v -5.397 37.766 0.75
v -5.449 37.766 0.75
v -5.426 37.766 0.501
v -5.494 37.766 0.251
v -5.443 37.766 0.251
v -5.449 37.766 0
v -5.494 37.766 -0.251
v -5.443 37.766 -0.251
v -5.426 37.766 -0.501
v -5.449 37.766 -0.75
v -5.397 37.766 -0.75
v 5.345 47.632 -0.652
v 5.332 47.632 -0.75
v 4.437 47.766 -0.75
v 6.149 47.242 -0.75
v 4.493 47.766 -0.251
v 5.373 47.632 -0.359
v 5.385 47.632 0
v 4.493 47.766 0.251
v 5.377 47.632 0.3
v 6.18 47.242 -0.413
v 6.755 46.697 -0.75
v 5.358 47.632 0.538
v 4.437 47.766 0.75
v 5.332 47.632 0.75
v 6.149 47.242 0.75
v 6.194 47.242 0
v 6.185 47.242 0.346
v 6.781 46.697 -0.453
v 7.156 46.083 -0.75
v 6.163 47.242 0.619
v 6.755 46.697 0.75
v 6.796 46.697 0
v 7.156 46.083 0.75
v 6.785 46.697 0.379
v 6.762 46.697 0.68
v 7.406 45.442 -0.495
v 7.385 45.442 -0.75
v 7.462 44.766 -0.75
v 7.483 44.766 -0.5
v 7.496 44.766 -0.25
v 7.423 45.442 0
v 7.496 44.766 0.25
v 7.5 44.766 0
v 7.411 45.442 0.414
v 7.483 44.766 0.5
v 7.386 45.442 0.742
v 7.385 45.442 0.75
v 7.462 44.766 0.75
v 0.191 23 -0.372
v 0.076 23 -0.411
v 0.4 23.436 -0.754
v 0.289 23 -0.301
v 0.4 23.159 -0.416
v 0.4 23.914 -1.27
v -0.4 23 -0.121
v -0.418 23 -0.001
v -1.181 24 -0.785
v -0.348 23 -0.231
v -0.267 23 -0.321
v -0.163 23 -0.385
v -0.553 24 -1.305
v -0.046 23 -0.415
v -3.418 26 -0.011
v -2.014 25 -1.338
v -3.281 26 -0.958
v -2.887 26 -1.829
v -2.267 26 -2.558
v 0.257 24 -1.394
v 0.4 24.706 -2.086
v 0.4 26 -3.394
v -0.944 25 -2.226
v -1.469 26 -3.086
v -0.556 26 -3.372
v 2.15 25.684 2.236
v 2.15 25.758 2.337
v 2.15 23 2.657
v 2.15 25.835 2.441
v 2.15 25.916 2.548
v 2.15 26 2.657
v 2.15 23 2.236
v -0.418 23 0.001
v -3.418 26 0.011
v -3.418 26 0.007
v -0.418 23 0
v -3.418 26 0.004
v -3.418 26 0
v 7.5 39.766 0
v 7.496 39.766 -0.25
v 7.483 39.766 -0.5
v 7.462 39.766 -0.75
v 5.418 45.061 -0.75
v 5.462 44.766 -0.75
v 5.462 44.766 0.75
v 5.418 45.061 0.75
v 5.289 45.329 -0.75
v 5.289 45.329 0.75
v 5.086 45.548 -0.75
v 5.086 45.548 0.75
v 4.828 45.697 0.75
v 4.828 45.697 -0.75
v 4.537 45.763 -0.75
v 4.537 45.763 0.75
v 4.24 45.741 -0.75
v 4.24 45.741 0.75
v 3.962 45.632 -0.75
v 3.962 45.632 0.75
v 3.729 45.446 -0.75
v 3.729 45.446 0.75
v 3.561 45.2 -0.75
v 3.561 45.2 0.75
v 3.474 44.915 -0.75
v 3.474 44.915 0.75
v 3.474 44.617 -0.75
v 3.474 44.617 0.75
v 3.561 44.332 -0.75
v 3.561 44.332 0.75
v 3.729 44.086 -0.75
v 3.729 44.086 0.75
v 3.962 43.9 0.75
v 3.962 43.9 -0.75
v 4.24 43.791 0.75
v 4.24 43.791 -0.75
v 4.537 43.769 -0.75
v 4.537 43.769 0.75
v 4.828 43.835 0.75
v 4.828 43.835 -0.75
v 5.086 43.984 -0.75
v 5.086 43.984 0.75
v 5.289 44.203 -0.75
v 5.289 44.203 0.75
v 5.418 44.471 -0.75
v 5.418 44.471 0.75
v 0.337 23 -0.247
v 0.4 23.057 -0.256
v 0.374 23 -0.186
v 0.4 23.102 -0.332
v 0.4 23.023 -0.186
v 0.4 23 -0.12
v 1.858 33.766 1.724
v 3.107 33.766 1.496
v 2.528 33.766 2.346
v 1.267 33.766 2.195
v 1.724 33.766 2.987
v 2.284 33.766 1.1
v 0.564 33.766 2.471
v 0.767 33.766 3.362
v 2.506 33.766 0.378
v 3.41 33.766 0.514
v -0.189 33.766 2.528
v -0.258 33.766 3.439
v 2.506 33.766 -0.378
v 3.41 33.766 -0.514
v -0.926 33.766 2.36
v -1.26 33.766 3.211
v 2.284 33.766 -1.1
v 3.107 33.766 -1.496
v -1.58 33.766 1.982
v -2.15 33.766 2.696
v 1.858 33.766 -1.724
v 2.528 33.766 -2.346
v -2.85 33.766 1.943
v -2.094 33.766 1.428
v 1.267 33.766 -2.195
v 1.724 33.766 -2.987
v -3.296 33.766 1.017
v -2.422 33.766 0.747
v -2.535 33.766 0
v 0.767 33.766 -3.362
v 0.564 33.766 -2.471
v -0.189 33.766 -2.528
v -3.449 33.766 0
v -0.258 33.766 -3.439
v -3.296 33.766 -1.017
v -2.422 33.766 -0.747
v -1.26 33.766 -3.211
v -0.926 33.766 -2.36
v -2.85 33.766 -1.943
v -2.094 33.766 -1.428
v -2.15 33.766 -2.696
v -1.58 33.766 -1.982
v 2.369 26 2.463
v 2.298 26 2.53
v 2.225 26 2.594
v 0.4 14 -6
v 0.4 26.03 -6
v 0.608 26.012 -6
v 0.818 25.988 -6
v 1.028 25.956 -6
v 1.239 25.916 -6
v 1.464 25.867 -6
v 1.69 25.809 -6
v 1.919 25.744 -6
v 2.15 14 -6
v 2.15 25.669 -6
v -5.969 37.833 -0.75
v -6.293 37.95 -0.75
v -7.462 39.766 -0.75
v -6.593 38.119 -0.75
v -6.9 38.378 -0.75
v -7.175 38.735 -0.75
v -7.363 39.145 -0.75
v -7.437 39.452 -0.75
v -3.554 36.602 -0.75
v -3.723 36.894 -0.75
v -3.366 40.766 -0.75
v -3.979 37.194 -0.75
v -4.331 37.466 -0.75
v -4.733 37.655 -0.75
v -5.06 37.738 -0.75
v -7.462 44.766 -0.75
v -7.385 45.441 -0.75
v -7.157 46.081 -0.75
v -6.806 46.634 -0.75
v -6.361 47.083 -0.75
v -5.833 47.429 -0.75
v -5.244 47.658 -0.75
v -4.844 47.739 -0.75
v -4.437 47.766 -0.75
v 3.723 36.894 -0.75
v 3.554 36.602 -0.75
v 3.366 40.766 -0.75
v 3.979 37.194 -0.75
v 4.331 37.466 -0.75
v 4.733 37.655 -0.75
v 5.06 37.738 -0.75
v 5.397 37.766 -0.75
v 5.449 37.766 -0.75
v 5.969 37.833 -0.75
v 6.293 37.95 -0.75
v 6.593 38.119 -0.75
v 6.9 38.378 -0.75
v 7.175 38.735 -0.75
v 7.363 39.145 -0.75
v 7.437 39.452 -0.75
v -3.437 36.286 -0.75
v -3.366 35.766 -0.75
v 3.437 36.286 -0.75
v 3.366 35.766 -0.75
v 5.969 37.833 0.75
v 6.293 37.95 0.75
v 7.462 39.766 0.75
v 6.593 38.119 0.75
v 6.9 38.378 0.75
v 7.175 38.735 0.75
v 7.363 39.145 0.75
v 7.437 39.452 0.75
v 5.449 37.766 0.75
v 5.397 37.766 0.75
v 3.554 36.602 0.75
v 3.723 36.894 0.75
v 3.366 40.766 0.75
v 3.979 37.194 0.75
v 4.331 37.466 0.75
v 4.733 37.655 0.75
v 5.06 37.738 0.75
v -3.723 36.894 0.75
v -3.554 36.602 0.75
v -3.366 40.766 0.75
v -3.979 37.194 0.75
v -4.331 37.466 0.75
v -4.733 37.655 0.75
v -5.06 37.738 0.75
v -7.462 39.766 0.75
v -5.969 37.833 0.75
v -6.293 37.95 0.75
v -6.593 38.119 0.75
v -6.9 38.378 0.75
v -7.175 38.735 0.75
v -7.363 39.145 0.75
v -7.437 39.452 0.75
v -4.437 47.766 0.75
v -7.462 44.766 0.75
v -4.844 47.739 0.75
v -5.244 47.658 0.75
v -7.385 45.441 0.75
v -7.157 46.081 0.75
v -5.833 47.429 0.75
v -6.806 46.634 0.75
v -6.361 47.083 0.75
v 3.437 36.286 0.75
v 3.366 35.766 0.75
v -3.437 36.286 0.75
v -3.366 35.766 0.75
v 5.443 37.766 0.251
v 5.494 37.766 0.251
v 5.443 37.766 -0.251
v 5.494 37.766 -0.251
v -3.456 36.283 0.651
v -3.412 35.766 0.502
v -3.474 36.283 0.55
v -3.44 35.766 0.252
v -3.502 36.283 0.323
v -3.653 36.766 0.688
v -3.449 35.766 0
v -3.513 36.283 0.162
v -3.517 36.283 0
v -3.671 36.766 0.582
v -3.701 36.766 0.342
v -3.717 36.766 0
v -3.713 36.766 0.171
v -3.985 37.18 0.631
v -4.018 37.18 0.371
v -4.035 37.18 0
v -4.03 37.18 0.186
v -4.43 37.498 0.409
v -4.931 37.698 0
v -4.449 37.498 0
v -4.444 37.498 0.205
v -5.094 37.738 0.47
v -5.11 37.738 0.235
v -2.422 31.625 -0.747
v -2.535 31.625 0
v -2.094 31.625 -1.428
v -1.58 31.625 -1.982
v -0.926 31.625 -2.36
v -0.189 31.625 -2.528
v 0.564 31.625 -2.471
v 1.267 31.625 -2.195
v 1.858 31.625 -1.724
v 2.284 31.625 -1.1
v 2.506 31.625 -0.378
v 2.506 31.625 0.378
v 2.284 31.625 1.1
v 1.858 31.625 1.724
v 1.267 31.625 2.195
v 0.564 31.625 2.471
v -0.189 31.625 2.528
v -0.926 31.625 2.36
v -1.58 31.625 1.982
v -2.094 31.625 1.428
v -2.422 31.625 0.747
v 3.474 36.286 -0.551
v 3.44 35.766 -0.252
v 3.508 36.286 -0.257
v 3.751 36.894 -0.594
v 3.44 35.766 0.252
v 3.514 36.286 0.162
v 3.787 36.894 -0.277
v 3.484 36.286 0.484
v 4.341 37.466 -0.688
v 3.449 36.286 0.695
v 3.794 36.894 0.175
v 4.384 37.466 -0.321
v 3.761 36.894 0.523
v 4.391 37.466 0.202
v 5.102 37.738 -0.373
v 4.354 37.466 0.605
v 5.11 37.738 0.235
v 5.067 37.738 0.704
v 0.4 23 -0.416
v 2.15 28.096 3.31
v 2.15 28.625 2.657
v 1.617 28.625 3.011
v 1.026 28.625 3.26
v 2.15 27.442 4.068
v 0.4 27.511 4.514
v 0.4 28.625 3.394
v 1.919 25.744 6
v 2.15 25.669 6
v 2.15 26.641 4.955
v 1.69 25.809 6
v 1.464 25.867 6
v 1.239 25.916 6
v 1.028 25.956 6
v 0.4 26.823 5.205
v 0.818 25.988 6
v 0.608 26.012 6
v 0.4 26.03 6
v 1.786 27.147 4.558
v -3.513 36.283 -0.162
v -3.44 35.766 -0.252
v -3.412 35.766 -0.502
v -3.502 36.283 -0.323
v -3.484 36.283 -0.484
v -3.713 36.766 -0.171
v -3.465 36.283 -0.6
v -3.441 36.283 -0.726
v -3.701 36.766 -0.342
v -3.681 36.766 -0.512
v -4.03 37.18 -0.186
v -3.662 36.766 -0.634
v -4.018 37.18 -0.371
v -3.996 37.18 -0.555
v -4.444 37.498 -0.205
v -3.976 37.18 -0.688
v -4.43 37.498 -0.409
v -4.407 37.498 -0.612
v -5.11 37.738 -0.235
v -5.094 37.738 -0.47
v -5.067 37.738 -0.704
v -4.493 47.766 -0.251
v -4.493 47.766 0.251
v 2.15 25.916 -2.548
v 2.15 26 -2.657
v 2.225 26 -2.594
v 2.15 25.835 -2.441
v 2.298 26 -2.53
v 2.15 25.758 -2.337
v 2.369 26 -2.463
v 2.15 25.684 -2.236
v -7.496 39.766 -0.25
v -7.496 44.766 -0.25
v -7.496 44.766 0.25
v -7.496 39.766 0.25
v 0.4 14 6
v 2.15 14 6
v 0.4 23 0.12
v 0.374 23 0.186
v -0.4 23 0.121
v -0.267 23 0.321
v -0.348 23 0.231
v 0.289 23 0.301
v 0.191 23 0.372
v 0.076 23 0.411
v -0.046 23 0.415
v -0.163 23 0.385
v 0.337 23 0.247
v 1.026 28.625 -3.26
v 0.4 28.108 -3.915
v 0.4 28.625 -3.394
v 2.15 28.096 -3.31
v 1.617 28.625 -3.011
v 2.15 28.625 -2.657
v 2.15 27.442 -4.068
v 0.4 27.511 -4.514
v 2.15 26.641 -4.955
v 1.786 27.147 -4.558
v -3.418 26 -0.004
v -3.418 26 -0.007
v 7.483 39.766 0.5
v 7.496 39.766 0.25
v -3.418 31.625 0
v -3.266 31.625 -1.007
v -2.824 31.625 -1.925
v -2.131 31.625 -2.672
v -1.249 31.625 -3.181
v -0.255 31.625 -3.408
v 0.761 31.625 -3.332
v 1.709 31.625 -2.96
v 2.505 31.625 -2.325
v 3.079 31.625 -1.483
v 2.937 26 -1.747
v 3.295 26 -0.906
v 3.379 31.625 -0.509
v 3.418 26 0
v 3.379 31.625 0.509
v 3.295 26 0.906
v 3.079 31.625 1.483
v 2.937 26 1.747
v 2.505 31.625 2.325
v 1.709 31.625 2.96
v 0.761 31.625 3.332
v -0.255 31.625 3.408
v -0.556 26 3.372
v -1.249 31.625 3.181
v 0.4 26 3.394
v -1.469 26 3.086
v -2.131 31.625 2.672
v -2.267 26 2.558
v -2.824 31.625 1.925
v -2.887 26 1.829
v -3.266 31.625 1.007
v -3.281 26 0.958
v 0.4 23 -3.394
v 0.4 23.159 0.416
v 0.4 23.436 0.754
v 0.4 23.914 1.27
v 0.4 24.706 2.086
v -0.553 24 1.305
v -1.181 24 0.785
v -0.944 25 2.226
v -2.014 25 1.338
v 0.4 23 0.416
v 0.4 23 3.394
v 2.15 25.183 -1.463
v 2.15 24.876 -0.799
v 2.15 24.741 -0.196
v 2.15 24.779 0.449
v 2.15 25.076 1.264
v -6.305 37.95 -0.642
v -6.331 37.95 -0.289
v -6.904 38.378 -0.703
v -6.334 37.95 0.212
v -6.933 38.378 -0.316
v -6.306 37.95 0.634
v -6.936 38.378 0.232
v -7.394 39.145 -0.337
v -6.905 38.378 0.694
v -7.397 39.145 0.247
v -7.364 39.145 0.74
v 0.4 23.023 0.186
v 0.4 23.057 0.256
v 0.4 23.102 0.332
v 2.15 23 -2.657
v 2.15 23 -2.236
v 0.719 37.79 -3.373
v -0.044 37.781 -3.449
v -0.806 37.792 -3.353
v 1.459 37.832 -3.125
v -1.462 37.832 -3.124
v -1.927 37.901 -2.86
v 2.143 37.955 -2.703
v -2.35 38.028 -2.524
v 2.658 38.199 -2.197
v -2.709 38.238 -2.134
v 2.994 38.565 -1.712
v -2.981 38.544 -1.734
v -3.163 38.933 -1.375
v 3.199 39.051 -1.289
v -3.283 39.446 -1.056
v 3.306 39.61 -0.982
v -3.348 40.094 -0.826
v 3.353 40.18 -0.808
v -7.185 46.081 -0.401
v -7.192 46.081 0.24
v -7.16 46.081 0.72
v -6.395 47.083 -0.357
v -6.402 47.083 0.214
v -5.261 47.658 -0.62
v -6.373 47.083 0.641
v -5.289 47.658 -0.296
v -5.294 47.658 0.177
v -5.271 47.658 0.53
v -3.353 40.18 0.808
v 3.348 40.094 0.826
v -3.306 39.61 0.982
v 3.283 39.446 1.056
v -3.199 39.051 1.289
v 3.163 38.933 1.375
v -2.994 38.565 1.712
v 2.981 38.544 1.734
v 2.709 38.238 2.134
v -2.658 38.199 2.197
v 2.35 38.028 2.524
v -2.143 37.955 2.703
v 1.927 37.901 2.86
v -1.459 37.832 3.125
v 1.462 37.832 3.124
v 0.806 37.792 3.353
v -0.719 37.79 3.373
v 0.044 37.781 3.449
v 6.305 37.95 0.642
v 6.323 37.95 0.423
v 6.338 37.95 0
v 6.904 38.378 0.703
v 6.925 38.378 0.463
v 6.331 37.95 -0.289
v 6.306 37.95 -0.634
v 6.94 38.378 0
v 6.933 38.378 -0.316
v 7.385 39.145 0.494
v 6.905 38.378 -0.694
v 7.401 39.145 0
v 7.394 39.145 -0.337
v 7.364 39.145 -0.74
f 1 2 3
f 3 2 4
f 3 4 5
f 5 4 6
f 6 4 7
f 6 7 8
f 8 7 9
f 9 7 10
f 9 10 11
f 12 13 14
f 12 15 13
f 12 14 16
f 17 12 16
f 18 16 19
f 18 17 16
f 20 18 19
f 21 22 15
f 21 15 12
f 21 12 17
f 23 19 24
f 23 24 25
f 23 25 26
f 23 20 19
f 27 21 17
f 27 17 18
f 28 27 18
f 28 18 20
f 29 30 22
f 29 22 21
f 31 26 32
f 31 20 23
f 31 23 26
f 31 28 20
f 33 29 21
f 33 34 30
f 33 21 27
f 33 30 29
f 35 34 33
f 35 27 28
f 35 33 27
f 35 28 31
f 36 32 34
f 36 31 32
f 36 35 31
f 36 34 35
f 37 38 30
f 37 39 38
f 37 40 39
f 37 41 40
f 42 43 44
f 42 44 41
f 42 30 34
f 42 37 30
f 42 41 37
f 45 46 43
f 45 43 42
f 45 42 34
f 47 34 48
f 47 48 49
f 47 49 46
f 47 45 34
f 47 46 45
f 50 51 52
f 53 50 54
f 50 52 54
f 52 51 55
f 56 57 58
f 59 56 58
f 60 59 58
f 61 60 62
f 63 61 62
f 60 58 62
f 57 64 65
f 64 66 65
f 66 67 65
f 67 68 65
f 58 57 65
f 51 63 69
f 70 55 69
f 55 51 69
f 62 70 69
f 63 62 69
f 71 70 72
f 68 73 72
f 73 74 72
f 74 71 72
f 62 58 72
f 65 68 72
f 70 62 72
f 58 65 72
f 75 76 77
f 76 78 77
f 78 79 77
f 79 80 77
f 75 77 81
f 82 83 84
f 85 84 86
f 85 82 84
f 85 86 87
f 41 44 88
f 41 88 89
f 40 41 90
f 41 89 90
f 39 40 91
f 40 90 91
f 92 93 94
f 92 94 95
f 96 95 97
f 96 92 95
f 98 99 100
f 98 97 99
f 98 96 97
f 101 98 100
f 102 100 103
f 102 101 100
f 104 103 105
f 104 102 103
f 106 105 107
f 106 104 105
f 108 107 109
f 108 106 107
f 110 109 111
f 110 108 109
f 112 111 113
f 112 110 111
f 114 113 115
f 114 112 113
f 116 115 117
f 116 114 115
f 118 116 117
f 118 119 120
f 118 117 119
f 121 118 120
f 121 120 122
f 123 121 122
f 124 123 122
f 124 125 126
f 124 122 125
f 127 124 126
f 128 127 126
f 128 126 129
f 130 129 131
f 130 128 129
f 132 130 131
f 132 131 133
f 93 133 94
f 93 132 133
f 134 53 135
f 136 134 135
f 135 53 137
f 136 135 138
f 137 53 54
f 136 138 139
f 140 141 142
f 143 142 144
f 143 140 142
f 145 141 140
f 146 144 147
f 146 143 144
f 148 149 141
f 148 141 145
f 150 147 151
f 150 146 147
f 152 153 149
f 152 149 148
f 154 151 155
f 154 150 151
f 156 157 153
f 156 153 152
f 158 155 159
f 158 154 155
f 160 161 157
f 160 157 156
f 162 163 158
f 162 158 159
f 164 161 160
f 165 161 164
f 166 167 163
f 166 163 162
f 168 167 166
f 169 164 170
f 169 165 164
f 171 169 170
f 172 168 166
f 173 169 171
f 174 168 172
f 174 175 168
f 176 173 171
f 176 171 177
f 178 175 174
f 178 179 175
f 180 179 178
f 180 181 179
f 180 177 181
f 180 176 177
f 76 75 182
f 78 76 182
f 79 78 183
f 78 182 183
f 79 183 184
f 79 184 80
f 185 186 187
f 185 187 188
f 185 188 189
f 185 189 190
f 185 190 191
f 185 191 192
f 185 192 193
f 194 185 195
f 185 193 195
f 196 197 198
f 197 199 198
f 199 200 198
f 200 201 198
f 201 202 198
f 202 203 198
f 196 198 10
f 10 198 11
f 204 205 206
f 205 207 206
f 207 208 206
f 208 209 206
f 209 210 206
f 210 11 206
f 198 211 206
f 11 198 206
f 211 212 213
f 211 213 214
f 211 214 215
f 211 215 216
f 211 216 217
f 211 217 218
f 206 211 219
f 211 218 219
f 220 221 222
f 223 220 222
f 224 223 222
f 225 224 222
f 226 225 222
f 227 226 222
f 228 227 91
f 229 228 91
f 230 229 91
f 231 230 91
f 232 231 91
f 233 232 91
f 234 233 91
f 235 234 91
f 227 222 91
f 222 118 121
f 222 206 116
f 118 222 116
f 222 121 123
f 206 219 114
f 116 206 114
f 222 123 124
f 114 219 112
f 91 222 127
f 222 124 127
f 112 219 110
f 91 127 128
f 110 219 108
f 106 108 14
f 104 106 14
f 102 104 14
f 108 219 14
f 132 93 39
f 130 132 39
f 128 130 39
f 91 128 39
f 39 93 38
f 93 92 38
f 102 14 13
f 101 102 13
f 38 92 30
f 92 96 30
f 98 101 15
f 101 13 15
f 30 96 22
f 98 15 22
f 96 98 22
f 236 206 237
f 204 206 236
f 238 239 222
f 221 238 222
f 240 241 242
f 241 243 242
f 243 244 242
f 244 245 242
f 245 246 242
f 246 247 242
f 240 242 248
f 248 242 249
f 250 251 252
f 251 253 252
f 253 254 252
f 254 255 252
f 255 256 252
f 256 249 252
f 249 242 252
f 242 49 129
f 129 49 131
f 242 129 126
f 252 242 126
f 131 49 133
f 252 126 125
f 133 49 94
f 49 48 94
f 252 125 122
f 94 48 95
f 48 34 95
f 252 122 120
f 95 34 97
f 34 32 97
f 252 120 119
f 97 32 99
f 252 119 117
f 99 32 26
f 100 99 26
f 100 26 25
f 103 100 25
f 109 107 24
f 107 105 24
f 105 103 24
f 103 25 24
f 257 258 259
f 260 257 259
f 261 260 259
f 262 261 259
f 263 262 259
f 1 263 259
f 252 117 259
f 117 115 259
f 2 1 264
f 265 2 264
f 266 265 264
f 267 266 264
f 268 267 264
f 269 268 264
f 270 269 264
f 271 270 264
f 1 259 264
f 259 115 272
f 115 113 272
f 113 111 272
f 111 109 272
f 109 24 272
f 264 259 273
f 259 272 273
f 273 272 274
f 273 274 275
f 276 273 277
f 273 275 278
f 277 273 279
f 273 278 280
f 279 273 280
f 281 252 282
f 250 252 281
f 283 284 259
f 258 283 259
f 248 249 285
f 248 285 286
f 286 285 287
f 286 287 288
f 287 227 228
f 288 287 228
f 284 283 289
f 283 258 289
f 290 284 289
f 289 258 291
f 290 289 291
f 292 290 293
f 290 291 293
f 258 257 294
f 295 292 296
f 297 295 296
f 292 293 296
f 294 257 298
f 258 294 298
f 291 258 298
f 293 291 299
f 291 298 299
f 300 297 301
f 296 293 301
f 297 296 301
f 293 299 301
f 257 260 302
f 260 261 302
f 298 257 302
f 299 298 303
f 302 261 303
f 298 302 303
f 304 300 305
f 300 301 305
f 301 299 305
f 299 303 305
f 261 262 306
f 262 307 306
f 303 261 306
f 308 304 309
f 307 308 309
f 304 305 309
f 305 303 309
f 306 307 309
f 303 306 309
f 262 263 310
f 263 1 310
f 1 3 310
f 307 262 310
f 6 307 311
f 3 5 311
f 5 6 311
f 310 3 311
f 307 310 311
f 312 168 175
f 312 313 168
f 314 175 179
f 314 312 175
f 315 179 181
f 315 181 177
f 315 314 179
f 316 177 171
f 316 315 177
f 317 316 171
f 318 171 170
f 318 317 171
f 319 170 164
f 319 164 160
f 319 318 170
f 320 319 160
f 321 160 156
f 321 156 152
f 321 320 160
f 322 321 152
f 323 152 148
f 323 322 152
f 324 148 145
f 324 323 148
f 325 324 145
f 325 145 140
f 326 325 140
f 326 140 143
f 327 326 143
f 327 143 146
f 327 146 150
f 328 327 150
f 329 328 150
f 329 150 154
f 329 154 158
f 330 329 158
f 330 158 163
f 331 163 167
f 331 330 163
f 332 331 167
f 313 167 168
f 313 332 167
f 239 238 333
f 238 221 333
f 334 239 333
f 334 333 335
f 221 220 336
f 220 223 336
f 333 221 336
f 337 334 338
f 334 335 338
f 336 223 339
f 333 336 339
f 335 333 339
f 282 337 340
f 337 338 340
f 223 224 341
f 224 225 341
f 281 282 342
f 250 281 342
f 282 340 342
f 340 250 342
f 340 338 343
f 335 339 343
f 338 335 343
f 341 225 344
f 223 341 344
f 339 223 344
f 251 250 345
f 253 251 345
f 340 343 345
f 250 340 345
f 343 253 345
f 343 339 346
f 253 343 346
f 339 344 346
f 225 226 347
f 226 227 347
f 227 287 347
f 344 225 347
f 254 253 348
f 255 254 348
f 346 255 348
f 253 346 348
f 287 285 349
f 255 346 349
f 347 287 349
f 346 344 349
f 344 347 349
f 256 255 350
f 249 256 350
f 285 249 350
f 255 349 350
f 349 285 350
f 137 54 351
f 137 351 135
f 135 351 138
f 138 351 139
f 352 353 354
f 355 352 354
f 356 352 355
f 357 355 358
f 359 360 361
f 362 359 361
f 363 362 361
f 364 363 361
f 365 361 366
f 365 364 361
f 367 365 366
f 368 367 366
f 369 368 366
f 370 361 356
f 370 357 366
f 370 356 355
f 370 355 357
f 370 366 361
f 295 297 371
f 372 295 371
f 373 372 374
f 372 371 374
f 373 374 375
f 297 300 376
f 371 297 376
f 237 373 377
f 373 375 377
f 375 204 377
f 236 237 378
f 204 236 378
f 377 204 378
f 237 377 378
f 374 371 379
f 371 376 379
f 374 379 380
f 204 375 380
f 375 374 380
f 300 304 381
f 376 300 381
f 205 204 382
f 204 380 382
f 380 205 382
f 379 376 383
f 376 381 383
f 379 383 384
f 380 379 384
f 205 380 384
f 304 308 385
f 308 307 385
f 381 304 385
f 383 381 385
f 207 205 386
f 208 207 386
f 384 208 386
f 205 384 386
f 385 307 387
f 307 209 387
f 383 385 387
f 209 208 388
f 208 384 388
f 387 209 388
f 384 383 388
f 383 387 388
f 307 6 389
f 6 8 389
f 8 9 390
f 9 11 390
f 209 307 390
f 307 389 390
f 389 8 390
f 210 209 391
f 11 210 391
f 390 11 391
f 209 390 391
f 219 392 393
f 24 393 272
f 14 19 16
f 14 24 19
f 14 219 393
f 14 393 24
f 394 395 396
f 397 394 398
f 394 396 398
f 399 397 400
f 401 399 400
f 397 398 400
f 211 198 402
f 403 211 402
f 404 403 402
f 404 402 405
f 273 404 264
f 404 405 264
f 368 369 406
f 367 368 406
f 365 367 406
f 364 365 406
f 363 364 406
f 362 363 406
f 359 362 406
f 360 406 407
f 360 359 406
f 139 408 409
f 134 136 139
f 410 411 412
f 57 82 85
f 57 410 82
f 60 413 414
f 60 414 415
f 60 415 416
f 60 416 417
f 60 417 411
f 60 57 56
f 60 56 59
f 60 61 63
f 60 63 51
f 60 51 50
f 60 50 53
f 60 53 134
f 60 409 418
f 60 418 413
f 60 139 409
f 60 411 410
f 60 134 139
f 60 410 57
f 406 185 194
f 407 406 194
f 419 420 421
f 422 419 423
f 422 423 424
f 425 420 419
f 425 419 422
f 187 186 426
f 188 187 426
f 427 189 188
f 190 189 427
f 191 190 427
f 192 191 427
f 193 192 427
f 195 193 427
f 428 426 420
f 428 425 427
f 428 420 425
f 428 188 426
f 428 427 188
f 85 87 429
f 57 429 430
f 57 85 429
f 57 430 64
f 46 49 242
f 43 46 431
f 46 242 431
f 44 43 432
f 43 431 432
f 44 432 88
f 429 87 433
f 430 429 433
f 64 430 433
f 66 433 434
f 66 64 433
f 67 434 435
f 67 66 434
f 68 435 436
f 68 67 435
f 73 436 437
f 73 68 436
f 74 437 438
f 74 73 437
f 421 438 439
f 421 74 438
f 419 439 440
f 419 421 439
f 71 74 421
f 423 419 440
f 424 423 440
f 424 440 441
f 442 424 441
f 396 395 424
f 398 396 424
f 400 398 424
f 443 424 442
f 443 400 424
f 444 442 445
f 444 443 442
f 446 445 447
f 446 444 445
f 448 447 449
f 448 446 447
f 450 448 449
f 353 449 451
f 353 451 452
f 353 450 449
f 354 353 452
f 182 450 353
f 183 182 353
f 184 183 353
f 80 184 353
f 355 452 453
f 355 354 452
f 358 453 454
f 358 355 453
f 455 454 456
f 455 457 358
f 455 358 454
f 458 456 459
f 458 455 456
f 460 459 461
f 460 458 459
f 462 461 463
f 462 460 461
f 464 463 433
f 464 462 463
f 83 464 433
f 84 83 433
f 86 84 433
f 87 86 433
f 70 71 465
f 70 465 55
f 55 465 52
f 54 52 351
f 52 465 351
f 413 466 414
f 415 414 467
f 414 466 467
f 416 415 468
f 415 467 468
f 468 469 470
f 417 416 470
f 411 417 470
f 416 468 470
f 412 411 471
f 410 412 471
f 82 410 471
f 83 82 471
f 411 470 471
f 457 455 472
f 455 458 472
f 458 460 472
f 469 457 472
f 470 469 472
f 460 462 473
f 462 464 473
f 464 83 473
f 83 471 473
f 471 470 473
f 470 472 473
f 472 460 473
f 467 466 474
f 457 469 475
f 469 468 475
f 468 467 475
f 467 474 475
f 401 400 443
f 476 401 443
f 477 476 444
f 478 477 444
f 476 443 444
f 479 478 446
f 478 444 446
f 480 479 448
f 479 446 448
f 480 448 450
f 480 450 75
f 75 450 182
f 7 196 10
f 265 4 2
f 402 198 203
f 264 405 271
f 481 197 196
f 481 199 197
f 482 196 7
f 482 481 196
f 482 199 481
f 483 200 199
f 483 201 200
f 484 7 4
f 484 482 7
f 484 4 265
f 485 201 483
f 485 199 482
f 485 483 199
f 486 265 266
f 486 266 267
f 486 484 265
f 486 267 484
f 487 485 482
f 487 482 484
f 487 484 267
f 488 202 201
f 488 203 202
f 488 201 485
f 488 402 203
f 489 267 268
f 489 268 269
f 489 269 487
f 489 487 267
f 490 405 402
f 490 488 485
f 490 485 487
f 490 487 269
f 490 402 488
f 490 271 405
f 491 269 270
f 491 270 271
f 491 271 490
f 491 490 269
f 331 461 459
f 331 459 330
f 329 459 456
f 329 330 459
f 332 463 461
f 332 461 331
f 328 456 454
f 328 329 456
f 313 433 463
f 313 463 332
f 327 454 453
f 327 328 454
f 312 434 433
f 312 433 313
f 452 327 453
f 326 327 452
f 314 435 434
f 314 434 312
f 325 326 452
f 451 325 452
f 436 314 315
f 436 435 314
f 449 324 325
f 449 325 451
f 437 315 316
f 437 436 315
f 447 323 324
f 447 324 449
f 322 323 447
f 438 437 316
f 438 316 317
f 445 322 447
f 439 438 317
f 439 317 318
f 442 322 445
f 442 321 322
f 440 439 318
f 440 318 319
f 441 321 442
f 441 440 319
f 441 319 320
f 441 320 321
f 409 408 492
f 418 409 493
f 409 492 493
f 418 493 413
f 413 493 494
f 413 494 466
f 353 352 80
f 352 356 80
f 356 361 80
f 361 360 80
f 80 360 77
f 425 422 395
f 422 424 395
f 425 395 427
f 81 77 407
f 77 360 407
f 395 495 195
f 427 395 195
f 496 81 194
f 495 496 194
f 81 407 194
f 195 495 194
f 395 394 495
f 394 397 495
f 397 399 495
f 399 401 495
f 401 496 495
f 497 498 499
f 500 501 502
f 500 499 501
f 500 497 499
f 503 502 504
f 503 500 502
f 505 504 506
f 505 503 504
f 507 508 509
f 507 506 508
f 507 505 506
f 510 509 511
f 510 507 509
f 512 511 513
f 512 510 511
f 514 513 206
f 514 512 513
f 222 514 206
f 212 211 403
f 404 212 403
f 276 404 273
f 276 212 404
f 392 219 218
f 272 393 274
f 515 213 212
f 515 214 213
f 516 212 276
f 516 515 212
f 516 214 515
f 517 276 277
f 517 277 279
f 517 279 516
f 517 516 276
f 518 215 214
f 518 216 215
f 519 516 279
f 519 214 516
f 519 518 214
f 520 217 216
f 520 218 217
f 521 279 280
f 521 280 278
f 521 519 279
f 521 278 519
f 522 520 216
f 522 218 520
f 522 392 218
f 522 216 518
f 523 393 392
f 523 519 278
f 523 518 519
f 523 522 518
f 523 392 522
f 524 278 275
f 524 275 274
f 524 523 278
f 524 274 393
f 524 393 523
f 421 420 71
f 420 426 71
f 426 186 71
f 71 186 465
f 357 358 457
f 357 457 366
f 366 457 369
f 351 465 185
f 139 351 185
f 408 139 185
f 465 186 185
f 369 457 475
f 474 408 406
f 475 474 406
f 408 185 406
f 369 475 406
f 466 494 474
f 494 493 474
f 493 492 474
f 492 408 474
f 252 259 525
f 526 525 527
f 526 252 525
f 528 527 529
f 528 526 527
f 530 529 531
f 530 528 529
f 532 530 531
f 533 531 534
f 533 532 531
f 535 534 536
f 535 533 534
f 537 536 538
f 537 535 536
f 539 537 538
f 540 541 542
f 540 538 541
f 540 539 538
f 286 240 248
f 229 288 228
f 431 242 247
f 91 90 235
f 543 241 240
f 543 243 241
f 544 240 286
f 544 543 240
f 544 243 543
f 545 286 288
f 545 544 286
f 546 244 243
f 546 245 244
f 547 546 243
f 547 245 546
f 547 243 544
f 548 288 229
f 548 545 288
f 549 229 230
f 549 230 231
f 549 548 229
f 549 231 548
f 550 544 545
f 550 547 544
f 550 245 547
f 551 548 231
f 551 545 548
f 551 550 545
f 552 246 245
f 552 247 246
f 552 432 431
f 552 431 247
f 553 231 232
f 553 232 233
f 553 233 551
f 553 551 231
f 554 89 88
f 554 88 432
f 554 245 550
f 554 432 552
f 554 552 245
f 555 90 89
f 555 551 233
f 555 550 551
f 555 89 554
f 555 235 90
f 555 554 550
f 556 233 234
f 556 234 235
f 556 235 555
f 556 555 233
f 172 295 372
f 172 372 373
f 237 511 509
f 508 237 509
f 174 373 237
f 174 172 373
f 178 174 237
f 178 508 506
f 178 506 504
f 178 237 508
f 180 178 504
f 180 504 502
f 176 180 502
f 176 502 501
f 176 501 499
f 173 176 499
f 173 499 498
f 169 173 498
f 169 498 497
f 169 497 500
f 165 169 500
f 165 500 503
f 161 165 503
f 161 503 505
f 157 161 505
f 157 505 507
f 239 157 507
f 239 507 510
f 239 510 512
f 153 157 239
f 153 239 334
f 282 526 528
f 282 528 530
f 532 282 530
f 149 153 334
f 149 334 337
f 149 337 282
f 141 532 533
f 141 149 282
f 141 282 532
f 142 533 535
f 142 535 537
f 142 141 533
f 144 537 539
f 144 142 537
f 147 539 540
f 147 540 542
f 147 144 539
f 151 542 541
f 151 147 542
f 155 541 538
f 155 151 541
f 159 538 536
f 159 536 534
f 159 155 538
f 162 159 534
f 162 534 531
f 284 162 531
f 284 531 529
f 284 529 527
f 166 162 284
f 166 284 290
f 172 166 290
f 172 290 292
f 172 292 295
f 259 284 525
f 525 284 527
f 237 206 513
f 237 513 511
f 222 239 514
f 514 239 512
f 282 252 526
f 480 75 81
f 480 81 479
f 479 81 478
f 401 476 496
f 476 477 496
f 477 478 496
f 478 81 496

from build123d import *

# Parameters (mm, degrees)
BOSS_EXTRUDE1_DEPTH      = 10
FILLET2_R                = 2
FILLET3_R                = 3
CUT_EXTRUDE1_DEPTH       = 49.473897211
CUT_EXTRUDE1_DEPTH_BACK  = 49.473897211
SKETCH3_R                = 1
BOSS_EXTRUDE2_DEPTH      = 6
BOSS_EXTRUDE2_DEPTH_BACK = 6
SKETCH4_W                = 1.75
SKETCH4_H                = 11.625349657
CHAMFER1_SIZE            = 3
CHAMFER2_SIZE            = 3


with BuildPart() as part:
    # Sketch1 → Revolve1 (revolve)
    with BuildSketch(Plane.XY):
        Polygon((-3.448914015, 37.765821371), (-3.448914015, 33.765821371), (-2.534753992, 33.765821371), (-2.534753992, 31.624967984), (-3.41766068, 31.624967984), (-3.41766068, 23), (0, 23), (0, 37.765821371), align=None)
    revolve(axis=Axis((0, 37.765821371, 0), (0, -1, 0)))

    # Sketch2 → Boss-Extrude1 (add)
    with BuildSketch(Plane(origin=(0, 37.765821371, 0), x_dir=(1, 0, 0), z_dir=(0, 1, 0))):
        with BuildLine():
            Line((3.366379046, 0.75), (-3.366379046, 0.75))
            ThreePointArc((-3.366379046, 0.75), (-3.448914015, 0), (-3.366379046, -0.75))
            Line((-3.366379046, -0.75), (3.366379046, -0.75))
            ThreePointArc((3.366379046, -0.75), (3.428218178, -0.37726384), (3.448914015, 0))
            ThreePointArc((3.448914015, 0), (3.428218178, 0.37726384), (3.366379046, 0.75))
        make_face()
        with BuildLine():
            Line((-3.366379046, 0.75), (-7.462405778, 0.75))
            ThreePointArc((-7.462405778, 0.75), (-7.5, 0), (-7.462405778, -0.75))
            Line((-7.462405778, -0.75), (-3.366379046, -0.75))
            ThreePointArc((-3.366379046, -0.75), (-3.448914015, 0), (-3.366379046, 0.75))
        make_face()
        with BuildLine():
            ThreePointArc((7.5, 0), (7.490595548, 0.375470813), (7.462405778, 0.75))
            Line((7.462405778, 0.75), (3.366379046, 0.75))
            ThreePointArc((3.366379046, 0.75), (3.428218178, 0.37726384), (3.448914015, 0))
            ThreePointArc((3.448914015, 0), (3.428218178, -0.37726384), (3.366379046, -0.75))
            Line((3.366379046, -0.75), (7.462405778, -0.75))
            ThreePointArc((7.462405778, -0.75), (7.490595548, -0.375470813), (7.5, 0))
        make_face()
    extrude(amount=BOSS_EXTRUDE1_DEPTH)

    # Fillet2
    # the kernel refuses this fillet: 2 mm, written as the material it adds along each edge
    with BuildSketch(Plane(origin=(0, 37.765821371, 0), x_dir=(-0.09803421101524086, 0, -0.9951830452085783), z_dir=(-0.9951830452085783, 0, 0.09803421101524086))) as fillet2_piece_1_section:
        with BuildLine():
            CenterArc((3.448914015 + FILLET2_R, FILLET2_R), FILLET2_R, 180, 90)
            Line((3.448914015 + FILLET2_R, 0), (3.448914015, 0))
            Line((3.448914015, 0), (3.448914015, FILLET2_R))
        make_face()
    fillet2_piece_1 = revolve(axis=Axis((0, 37.765821371, 0), (0, -1, 0)), revolution_arc=191.251965623, mode=Mode.PRIVATE)
    fillet2_piece_1 = split(fillet2_piece_1, bisect_by=Plane(origin=(3.870689991, 37.318827735, -0.75), z_dir=(0, 0, 1)), keep=Keep.TOP, mode=Mode.PRIVATE)
    fillet2_piece_1 = split(fillet2_piece_1, bisect_by=Plane(origin=(3.870689991, 37.318827735, 0.75), z_dir=(0, 0, -1)), keep=Keep.TOP, mode=Mode.PRIVATE)
    add(fillet2_piece_1)
    with BuildSketch(Plane(origin=(0, 37.765821371, 0), x_dir=(0.09800035789508027, 0, 0.9951863794548418), z_dir=(0.9951863794548418, 0, -0.09800035789508027))) as fillet2_piece_2_section:
        with BuildLine():
            CenterArc((3.448914015 + FILLET2_R, FILLET2_R), FILLET2_R, 180, 90)
            Line((3.448914015 + FILLET2_R, 0), (3.448914015, 0))
            Line((3.448914015, 0), (3.448914015, FILLET2_R))
        make_face()
    fillet2_piece_2 = revolve(axis=Axis((0, 37.765821371, 0), (0, -1, 0)), revolution_arc=95.624033786, mode=Mode.PRIVATE)
    fillet2_piece_2 = split(fillet2_piece_2, bisect_by=Plane(origin=(-3.870690025, 37.318827894, 0.75), z_dir=(0, 0, -1)), keep=Keep.TOP, mode=Mode.PRIVATE)
    add(fillet2_piece_2)
    with BuildSketch(Plane(origin=(0, 37.765821371, 0), x_dir=(-1, 0, 0), z_dir=(0, 0, 1))) as fillet2_piece_3_section:
        with BuildLine():
            CenterArc((3.448914015 + FILLET2_R, FILLET2_R), FILLET2_R, 180, 90)
            Line((3.448914015 + FILLET2_R, 0), (3.448914015, 0))
            Line((3.448914015, 0), (3.448914015, FILLET2_R))
        make_face()
    fillet2_piece_3 = revolve(axis=Axis((0, 37.765821371, 0), (0, -1, 0)), revolution_arc=95.624033786, mode=Mode.PRIVATE)
    fillet2_piece_3 = split(fillet2_piece_3, bisect_by=Plane(origin=(-3.870689874, 37.318828004, -0.75), z_dir=(0, 0, 1)), keep=Keep.TOP, mode=Mode.PRIVATE)
    add(fillet2_piece_3)
    # the kernel refuses this fillet: 2 mm, written as the material it takes off along each edge
    with BuildSketch(Plane(origin=(0, 37.765821371, 0), x_dir=(-0.7201079494948177, 0, -0.6938620475817721), z_dir=(0.6938620475817721, 0, -0.7201079494948177))) as fillet2_2_piece_1:
        with BuildLine():
            CenterArc((7.5 - FILLET2_R, FILLET2_R), FILLET2_R, 270, 90)
            Line((7.5, FILLET2_R), (7.5, 0))
            Line((7.5, 0), (7.5 - FILLET2_R, 0))
        make_face()
    revolve(axis=Axis((0, 37.765821371, 0), (0, 1, 0)), revolution_arc=87.873212667, mode=Mode.SUBTRACT)
    with BuildSketch(Plane(origin=(0, 37.765821371, 0), x_dir=(0.7201079494948216, 0, 0.6938620475817678), z_dir=(-0.6938620475817678, 0, 0.7201079494948216))) as fillet2_2_piece_2:
        with BuildLine():
            CenterArc((7.5 - FILLET2_R, FILLET2_R), FILLET2_R, 270, 90)
            Line((7.5 - FILLET2_R, 0), (7.5, 0))
            Line((7.5, 0), (7.5, FILLET2_R))
        make_face()
    revolve(axis=Axis((0, 37.765821371, 0), (0, 1, 0)), revolution_arc=87.873212667, mode=Mode.SUBTRACT)

    # Fillet3
    # the kernel refuses this fillet: 3 mm, written as the material it adds along each edge
    with BuildSketch(Plane(origin=(10.866379046, 37.765821371, -0.75), x_dir=(0, 1, 0), z_dir=(-1, 0, 0))) as fillet3_piece_1_section:
        with BuildLine():
            CenterArc((FILLET3_R, FILLET3_R), FILLET3_R, 180, 90)
            Line((0, FILLET3_R), (0, 0))
            Line((0, 0), (FILLET3_R, 0))
        make_face()
    fillet3_piece_1 = extrude(amount=21.732758092, mode=Mode.PRIVATE)
    fillet3_piece_1 = fillet3_piece_1 & Plane(origin=(0, 38.470226203, 0), x_dir=(-1, 0, 0), z_dir=(0, -1, 0)) * Cylinder(3.448914015, 56, mode=Mode.PRIVATE)
    add(fillet3_piece_1)
    with BuildSketch(Plane(origin=(10.866379046, 37.765821371, 0.75), x_dir=(0, 1, 0), z_dir=(-1, 0, 0))) as fillet3_piece_2_section:
        with BuildLine():
            CenterArc((FILLET3_R, -FILLET3_R), FILLET3_R, 90, 90)
            Line((0, -FILLET3_R), (0, 0))
            Line((0, 0), (FILLET3_R, 0))
        make_face()
    fillet3_piece_2 = extrude(amount=21.732758092, mode=Mode.PRIVATE)
    fillet3_piece_2 = fillet3_piece_2 & Plane(origin=(0, 38.470226203, 0), x_dir=(-1, 0, 0), z_dir=(0, -1, 0)) * Cylinder(3.448914015, 56, mode=Mode.PRIVATE)
    add(fillet3_piece_2)
    # the kernel refuses this fillet: 3 mm, written as the material it takes off along each edge
    with BuildSketch(Plane(origin=(0, 47.765821371, 0), x_dir=(-0.4534410859899706, 0, -0.8912862511764871), z_dir=(0.8912862511764871, 0, -0.4534410859899706))) as fillet3_2_piece_1:
        with BuildLine():
            CenterArc((7.5 - FILLET3_R, -FILLET3_R), FILLET3_R, 0, 90)
            Line((7.5 - FILLET3_R, 0), (7.5, 0))
            Line((7.5, 0), (7.5, -FILLET3_R))
        make_face()
    revolve(axis=Axis((0, 47.765821371, 0), (0, 1, 0)), revolution_arc=126.070648523, mode=Mode.SUBTRACT)
    with BuildSketch(Plane(origin=(0, 47.765821371, 0), x_dir=(0.4534410859901425, 0, -0.8912862511763997), z_dir=(-0.8912862511763997, 0, -0.4534410859901425))) as fillet3_2_piece_2:
        with BuildLine():
            CenterArc((7.5 - FILLET3_R, FILLET3_R), FILLET3_R, 270, 90)
            Line((7.5, FILLET3_R), (7.5, 0))
            Line((7.5, 0), (7.5 - FILLET3_R, 0))
        make_face()
    revolve(axis=Axis((0, 47.765821371, 0), (0, -1, 0)), revolution_arc=126.070648523, mode=Mode.SUBTRACT)

    # Sketch3 → Cut-Extrude1 (cut, two sides: drawn at the far end of the back side and taken through both)
    with BuildSketch(Plane.XY.offset(-CUT_EXTRUDE1_DEPTH_BACK)):
        with Locations((4.462405778, 44.765821371)):
            Circle(SKETCH3_R)
    extrude(amount=CUT_EXTRUDE1_DEPTH + CUT_EXTRUDE1_DEPTH_BACK, mode=Mode.SUBTRACT)

    # Sketch4 → Boss-Extrude2 (add, two sides: drawn at the far end of the back side and taken through both)
    with BuildSketch(Plane.XY.offset(-BOSS_EXTRUDE2_DEPTH_BACK)):
        with Locations((1.275, 19.812674829)):
            Rectangle(SKETCH4_W, SKETCH4_H)
    extrude(amount=BOSS_EXTRUDE2_DEPTH + BOSS_EXTRUDE2_DEPTH_BACK)

    # Chamfer1
    # the kernel refuses this chamfer: 3 mm, written as the material it adds along each edge
    with BuildSketch(Plane(origin=(0, 25.625349657, 0), x_dir=(0.20228823053710607, 0, -0.9793260293621153), z_dir=(-0.9793260293621153, 0, -0.20228823053710607))) as chamfer1_piece_1_section:
        Polygon((3.41766068, -CHAMFER1_SIZE), (3.41766068 + CHAMFER1_SIZE, 0), (3.41766068, 0), align=None)
    chamfer1_piece_1 = revolve(axis=Axis((0, 25.625349657, 0), (0, -1, 0)), revolution_arc=290.954478768, mode=Mode.PRIVATE)
    chamfer1_piece_1 = split(chamfer1_piece_1, bisect_by=Plane(origin=(0.4, 26.674438402, -4.015172559), z_dir=(1, 0, 0)), keep=Keep.TOP, mode=Mode.PRIVATE)
    chamfer1_piece_1 = split(chamfer1_piece_1, bisect_by=Plane(origin=(2.15, 26.674438402, -4.015172559), z_dir=(-1, 0, 0)), keep=Keep.TOP, mode=Mode.PRIVATE)
    chamfer1_piece_1 = split(chamfer1_piece_1, bisect_by=Plane(origin=(1.527141466, 26.674438402, -6), z_dir=(0, 0, 1)), keep=Keep.TOP, mode=Mode.PRIVATE)
    chamfer1_piece_1 = split(chamfer1_piece_1, bisect_by=Plane(origin=(1.527141466, 26.674438402, 6), z_dir=(0, 0, -1)), keep=Keep.TOP, mode=Mode.PRIVATE)
    add(chamfer1_piece_1)
    with BuildSketch(Plane(origin=(0, 25.625349657, 0), x_dir=(-0.8422146057104749, 0, 0.5391424282394677), z_dir=(0.5391424282394677, 0, 0.8422146057104749))) as chamfer1_piece_2_section:
        Polygon((3.41766068, -CHAMFER1_SIZE), (3.41766068 + CHAMFER1_SIZE, 0), (3.41766068, 0), align=None)
    chamfer1_piece_2 = revolve(axis=Axis((0, 25.625349657, 0), (0, -1, 0)), revolution_arc=290.954478768, mode=Mode.PRIVATE)
    chamfer1_piece_2 = split(chamfer1_piece_2, bisect_by=Plane(origin=(0.4, 26.639588442, -4.151887782), z_dir=(1, 0, 0)), keep=Keep.TOP, mode=Mode.PRIVATE)
    chamfer1_piece_2 = split(chamfer1_piece_2, bisect_by=Plane(origin=(2.15, 26.639588442, -4.151887782), z_dir=(-1, 0, 0)), keep=Keep.TOP, mode=Mode.PRIVATE)
    chamfer1_piece_2 = split(chamfer1_piece_2, bisect_by=Plane(origin=(1.298873136, 26.639588442, -6), z_dir=(0, 0, 1)), keep=Keep.TOP, mode=Mode.PRIVATE)
    chamfer1_piece_2 = split(chamfer1_piece_2, bisect_by=Plane(origin=(1.298873136, 26.639588442, 6), z_dir=(0, 0, -1)), keep=Keep.TOP, mode=Mode.PRIVATE)
    add(chamfer1_piece_2)

    # Chamfer2
    # the kernel refuses this chamfer: 3 mm, written as the material it takes off along each edge
    with BuildSketch(Plane(origin=(0, 23, 0), x_dir=(-0.9999950652018582, 0, -0.003141587485879368), z_dir=(-0.003141587485879368, 0, 0.9999950652018582))) as chamfer2_piece_1_section:
        Polygon((3.41766068 - CHAMFER2_SIZE, 0), (3.41766068, -CHAMFER2_SIZE), (3.41766068, 0), align=None)
    chamfer2_piece_1 = revolve(axis=Axis((0, 23, 0), (0, -1, 0)), revolution_arc=359.64, mode=Mode.PRIVATE)
    chamfer2_piece_1 = split(chamfer2_piece_1, bisect_by=Plane(origin=(0.4, 23.418910756, -0.767888946), z_dir=(-1, 0, 0)), keep=Keep.TOP, mode=Mode.PRIVATE)
    add(chamfer2_piece_1, mode=Mode.SUBTRACT)
    with BuildSketch(Plane(origin=(0, 23, 0), x_dir=(-0.9999950652018582, 0, -0.003141587485879368), z_dir=(-0.003141587485879368, 0, 0.9999950652018582))) as chamfer2_piece_2_section:
        Polygon((3.41766068 - CHAMFER2_SIZE, 0), (3.41766068, -CHAMFER2_SIZE), (3.41766068, 0), align=None)
    chamfer2_piece_2 = revolve(axis=Axis((0, 23, 0), (0, -1, 0)), revolution_arc=359.64, mode=Mode.PRIVATE)
    chamfer2_piece_2 = split(chamfer2_piece_2, bisect_by=Plane(origin=(2.15, 24.31046368, -3e-09), z_dir=(1, 0, 0)), keep=Keep.TOP, mode=Mode.PRIVATE)
    add(chamfer2_piece_2, mode=Mode.SUBTRACT)
    with BuildSketch(Plane(origin=(0, 23, 0), x_dir=(-1, 0, 0), z_dir=(0, 0, 1))) as chamfer2_piece_3_section:
        Polygon((3.41766068, -CHAMFER2_SIZE), (3.41766068 - CHAMFER2_SIZE, 0), (3.41766068, 0), align=None)
    chamfer2_piece_3 = revolve(axis=Axis((0, 23, 0), (0, -1, 0)), revolution_arc=226.121119214, mode=Mode.PRIVATE)
    chamfer2_piece_3 = split(chamfer2_piece_3, bisect_by=Plane(origin=(0.4, 24.102417014, -1.763188428), z_dir=(-1, 0, 0)), keep=Keep.TOP, mode=Mode.PRIVATE)
    add(chamfer2_piece_3, mode=Mode.SUBTRACT)
    with BuildSketch(Plane(origin=(0, 23, 0), x_dir=(-1, 0, 0), z_dir=(0, 0, 1))) as chamfer2_piece_4_section:
        Polygon((3.41766068, -CHAMFER2_SIZE), (3.41766068 - CHAMFER2_SIZE, 0), (3.41766068, 0), align=None)
    chamfer2_piece_4 = revolve(axis=Axis((0, 23, 0), (0, -1, 0)), revolution_arc=226.121119214, mode=Mode.PRIVATE)
    chamfer2_piece_4 = split(chamfer2_piece_4, bisect_by=Plane(origin=(2.15, 24.306348472, -0.040273497), z_dir=(1, 0, 0)), keep=Keep.TOP, mode=Mode.PRIVATE)
    add(chamfer2_piece_4, mode=Mode.SUBTRACT)
    with BuildSketch(Plane(origin=(0, 23, 0), x_dir=(0.6931361861639339, 0, -0.7208066505174022), z_dir=(-0.7208066505174022, 0, -0.6931361861639339))) as chamfer2_piece_5_section:
        Polygon((3.41766068, -CHAMFER2_SIZE), (3.41766068 - CHAMFER2_SIZE, 0), (3.41766068, 0), align=None)
    chamfer2_piece_5 = revolve(axis=Axis((0, 23, 0), (0, -1, 0)), revolution_arc=226.121119214, mode=Mode.PRIVATE)
    chamfer2_piece_5 = split(chamfer2_piece_5, bisect_by=Plane(origin=(2.15, 24.306348462, 0.040273494), z_dir=(1, 0, 0)), keep=Keep.TOP, mode=Mode.PRIVATE)
    add(chamfer2_piece_5, mode=Mode.SUBTRACT)
    with BuildSketch(Plane(origin=(0, 23, 0), x_dir=(0.6931361861639339, 0, -0.7208066505174022), z_dir=(-0.7208066505174022, 0, -0.6931361861639339))) as chamfer2_piece_6_section:
        Polygon((3.41766068, -CHAMFER2_SIZE), (3.41766068 - CHAMFER2_SIZE, 0), (3.41766068, 0), align=None)
    chamfer2_piece_6 = revolve(axis=Axis((0, 23, 0), (0, -1, 0)), revolution_arc=226.121119214, mode=Mode.PRIVATE)
    chamfer2_piece_6 = split(chamfer2_piece_6, bisect_by=Plane(origin=(0.4, 24.102417086, 1.763188451), z_dir=(-1, 0, 0)), keep=Keep.TOP, mode=Mode.PRIVATE)
    add(chamfer2_piece_6, mode=Mode.SUBTRACT)


solid = part.part
